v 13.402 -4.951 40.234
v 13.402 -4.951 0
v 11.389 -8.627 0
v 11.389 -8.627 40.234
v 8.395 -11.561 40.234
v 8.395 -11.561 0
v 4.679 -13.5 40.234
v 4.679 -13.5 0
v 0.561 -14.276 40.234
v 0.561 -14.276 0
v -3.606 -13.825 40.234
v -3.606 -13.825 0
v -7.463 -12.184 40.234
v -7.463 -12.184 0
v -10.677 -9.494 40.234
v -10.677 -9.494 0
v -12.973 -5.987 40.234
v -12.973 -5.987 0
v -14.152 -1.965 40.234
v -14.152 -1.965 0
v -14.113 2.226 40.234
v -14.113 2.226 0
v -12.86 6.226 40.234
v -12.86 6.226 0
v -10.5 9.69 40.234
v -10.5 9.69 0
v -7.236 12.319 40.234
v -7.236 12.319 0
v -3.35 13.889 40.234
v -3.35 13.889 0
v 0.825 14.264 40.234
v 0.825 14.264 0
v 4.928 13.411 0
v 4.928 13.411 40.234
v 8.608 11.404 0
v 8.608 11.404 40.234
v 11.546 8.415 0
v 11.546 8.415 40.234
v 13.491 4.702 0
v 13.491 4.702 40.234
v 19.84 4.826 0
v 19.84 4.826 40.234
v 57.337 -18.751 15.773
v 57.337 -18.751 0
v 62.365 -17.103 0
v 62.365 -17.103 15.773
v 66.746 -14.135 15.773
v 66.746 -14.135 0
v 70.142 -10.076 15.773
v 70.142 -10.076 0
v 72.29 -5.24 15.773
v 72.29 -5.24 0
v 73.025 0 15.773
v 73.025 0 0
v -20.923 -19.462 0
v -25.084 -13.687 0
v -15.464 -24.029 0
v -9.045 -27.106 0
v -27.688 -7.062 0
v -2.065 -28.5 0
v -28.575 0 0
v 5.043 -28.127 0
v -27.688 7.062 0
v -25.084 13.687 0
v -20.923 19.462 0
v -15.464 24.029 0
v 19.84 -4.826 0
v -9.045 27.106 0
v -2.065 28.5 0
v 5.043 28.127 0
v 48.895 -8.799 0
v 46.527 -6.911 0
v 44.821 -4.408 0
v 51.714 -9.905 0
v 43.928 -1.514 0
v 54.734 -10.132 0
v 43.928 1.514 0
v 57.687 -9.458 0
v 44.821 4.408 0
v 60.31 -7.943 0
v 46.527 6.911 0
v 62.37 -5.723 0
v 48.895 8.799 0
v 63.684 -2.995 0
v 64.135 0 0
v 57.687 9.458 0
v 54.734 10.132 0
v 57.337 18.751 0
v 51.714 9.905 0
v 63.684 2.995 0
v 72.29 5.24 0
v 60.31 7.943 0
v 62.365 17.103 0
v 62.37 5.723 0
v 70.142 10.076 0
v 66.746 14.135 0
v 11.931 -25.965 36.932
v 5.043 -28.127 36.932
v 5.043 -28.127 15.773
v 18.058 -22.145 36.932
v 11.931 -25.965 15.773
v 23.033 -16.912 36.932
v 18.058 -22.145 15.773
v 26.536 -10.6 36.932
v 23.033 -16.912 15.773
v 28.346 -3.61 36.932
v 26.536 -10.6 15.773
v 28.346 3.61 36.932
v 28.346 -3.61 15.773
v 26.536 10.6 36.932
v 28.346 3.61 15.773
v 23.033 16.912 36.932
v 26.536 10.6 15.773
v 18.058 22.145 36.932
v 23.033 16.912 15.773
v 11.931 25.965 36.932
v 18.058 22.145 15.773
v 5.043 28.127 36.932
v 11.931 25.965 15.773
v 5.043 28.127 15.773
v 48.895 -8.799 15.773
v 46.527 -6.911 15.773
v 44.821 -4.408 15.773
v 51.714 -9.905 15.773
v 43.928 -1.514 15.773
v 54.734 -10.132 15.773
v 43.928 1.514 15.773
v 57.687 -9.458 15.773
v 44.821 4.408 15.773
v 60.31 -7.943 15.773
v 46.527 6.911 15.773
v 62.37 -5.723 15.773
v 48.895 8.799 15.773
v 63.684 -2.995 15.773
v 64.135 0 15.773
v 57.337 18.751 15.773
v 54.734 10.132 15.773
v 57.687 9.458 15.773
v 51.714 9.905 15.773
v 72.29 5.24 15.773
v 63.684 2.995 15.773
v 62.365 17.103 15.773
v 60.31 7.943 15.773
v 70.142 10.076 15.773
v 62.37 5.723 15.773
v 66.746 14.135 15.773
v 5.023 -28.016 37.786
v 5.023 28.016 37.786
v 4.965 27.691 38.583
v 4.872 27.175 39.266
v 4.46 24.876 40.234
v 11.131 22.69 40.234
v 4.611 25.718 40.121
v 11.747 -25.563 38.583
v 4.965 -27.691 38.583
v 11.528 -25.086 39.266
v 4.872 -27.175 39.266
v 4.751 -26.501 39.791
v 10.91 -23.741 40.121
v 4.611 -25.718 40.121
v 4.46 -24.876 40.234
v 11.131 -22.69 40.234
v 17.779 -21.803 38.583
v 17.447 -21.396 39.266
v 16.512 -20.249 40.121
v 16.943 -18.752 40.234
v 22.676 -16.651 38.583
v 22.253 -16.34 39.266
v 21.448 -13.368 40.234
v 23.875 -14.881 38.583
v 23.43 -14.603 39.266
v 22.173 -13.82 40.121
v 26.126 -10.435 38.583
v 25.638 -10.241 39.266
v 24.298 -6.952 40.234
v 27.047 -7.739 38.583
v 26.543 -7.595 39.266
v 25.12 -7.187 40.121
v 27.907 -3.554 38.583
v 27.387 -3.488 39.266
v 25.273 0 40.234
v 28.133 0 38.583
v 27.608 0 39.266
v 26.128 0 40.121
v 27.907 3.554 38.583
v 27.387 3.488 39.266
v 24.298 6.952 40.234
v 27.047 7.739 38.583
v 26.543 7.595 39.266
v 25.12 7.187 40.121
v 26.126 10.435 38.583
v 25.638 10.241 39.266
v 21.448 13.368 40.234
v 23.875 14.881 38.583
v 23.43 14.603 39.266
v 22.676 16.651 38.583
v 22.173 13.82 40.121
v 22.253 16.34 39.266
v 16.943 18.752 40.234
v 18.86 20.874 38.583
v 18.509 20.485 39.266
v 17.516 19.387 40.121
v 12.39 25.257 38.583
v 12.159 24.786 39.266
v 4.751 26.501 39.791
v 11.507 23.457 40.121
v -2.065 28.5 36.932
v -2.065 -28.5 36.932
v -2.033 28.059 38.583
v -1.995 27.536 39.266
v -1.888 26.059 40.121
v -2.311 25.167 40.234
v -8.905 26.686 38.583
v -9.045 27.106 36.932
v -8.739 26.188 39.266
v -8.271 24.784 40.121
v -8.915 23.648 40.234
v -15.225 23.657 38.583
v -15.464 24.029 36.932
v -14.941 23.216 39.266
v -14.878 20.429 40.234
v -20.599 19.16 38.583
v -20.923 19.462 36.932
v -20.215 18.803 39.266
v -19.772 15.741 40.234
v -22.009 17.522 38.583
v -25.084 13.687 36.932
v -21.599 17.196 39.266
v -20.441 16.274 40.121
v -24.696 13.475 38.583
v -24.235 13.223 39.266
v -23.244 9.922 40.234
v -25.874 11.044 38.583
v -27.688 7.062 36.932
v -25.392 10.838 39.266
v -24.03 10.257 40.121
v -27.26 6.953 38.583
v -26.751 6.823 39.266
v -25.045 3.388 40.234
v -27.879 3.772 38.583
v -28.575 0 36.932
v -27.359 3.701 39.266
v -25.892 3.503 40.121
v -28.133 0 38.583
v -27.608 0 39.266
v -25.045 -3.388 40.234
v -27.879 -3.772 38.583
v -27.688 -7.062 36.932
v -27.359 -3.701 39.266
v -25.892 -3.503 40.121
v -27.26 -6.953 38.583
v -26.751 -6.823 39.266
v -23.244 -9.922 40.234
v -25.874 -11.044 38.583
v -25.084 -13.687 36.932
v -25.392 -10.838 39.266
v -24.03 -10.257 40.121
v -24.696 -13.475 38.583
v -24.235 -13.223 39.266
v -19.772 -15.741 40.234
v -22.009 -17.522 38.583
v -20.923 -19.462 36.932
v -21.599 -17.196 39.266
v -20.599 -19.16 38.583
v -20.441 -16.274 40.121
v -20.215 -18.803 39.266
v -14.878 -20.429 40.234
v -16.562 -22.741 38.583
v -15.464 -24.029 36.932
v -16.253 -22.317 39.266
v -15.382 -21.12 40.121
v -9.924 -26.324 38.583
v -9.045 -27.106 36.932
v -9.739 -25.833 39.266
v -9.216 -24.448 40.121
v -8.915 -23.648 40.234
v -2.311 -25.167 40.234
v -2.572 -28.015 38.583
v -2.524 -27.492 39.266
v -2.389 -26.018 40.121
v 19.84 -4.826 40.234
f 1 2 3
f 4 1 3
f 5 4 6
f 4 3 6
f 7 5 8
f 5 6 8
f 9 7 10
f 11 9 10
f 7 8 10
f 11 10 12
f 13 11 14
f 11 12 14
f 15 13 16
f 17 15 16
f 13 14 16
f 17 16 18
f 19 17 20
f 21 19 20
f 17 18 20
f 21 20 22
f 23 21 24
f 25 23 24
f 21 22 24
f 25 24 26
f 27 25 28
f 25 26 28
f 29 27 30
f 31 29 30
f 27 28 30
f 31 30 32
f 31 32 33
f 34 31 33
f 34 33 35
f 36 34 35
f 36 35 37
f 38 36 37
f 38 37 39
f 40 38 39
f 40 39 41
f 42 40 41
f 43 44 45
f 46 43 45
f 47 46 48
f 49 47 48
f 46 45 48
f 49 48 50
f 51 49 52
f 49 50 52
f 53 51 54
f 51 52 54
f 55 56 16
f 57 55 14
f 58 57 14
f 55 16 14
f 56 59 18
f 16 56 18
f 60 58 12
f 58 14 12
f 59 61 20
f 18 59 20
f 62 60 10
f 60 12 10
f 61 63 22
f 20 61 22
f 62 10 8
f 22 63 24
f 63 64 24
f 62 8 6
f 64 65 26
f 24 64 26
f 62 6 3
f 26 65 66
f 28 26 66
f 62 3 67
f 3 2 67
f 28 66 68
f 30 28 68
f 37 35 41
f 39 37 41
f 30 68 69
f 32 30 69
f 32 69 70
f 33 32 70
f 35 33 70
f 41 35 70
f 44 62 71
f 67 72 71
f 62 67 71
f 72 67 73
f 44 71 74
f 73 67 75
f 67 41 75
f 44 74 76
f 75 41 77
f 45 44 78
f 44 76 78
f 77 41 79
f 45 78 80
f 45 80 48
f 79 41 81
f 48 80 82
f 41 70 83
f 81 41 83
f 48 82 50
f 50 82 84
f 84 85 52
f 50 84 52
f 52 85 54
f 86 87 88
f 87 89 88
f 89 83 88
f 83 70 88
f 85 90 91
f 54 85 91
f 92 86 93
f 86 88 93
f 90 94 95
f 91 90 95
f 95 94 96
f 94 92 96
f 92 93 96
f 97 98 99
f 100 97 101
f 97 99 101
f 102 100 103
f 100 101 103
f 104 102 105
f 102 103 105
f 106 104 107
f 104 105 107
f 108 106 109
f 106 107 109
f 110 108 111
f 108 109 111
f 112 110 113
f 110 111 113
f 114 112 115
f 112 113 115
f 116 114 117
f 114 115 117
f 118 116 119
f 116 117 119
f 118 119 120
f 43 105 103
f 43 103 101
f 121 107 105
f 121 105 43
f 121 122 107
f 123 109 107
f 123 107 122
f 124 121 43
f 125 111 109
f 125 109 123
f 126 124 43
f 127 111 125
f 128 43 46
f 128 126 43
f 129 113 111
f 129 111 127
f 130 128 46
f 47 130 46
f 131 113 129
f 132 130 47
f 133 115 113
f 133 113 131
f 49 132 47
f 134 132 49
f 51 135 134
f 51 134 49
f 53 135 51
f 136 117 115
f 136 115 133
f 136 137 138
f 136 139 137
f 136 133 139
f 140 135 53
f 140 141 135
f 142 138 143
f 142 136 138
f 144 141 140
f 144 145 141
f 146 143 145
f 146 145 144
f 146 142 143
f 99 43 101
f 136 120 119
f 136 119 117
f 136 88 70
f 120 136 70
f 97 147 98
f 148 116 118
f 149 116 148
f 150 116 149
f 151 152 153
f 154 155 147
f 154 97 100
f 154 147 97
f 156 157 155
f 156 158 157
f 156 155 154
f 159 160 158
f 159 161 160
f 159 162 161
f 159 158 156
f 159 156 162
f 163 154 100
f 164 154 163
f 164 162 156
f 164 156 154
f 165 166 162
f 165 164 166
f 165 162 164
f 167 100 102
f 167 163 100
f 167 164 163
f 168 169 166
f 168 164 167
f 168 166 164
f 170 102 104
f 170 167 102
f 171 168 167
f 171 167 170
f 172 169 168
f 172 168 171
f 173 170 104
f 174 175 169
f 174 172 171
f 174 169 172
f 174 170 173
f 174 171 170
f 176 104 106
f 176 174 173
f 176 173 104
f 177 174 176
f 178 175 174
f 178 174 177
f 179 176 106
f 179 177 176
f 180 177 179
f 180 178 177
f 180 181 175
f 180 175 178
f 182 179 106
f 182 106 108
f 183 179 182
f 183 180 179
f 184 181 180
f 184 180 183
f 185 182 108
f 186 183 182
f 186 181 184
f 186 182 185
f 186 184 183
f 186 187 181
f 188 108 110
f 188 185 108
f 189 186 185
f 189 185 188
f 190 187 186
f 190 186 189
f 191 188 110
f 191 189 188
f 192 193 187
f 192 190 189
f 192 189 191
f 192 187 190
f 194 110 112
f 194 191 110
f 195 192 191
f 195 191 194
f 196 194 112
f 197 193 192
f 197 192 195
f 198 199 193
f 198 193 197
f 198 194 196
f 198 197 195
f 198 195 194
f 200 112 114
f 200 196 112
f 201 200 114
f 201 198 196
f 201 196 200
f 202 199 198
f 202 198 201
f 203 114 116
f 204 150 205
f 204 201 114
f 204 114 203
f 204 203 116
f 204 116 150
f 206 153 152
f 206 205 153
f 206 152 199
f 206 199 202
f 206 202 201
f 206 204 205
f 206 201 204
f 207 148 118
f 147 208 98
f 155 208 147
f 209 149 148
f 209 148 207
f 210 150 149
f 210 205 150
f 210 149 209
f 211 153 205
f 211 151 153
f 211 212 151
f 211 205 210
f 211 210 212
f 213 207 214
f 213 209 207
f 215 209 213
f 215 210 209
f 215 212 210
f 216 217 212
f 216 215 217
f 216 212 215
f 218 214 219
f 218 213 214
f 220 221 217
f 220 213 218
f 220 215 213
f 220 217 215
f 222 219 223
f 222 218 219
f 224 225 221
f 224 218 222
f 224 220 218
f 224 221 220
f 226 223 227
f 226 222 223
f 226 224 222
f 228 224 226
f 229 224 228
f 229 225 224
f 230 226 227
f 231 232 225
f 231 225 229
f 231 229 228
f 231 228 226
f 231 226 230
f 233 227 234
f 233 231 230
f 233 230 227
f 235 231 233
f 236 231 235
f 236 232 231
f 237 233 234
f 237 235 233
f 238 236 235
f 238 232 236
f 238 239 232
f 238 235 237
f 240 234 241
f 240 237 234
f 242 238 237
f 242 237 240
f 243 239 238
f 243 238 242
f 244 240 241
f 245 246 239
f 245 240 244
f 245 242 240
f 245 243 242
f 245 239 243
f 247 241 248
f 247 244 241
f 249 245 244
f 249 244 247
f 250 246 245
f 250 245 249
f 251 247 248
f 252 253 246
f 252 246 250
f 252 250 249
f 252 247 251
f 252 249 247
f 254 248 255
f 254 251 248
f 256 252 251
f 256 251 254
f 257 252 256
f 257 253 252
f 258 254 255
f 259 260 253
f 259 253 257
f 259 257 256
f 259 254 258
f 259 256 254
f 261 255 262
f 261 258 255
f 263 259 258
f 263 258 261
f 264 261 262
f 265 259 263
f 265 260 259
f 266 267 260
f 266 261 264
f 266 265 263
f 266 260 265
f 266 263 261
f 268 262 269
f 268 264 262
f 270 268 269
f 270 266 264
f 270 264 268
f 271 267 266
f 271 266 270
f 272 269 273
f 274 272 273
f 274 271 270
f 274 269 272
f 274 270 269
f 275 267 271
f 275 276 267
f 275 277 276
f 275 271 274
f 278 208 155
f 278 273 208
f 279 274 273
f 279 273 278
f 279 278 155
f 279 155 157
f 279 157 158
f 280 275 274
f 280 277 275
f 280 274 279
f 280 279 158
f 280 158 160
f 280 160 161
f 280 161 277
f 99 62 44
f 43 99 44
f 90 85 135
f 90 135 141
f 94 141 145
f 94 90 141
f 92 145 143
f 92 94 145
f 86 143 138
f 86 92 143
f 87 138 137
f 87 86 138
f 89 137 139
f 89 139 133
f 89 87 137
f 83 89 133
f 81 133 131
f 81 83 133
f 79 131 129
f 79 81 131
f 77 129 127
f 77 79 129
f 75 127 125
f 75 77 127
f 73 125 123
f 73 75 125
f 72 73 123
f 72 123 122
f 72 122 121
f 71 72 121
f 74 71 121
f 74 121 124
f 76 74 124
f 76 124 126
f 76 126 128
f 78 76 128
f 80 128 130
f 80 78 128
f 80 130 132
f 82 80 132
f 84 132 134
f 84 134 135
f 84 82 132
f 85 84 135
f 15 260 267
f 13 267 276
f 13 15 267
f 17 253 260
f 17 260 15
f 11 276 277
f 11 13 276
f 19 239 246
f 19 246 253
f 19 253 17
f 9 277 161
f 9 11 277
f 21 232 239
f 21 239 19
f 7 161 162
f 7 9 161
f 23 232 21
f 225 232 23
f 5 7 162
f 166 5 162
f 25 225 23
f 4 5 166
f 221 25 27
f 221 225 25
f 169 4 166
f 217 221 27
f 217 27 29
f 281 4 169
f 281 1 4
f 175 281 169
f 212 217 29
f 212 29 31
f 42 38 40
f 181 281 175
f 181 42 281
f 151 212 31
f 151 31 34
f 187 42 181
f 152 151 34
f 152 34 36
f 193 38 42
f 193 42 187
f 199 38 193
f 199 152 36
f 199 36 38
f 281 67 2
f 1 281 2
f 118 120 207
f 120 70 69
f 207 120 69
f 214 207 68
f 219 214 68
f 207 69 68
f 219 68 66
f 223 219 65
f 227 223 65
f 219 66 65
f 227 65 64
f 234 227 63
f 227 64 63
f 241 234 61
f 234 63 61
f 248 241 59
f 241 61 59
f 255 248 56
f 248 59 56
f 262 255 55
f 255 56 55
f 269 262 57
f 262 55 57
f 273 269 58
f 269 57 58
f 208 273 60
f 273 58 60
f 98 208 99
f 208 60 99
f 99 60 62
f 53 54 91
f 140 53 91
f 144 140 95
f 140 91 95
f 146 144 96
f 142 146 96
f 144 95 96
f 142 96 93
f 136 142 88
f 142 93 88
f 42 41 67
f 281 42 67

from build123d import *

# Parameters (mm, degrees)
F1_DEPTH = 40.2336
F0_R     = 10.16
F2_DEPTH = 15.7734
F3_R     = 3.302


# Not quite as in the source:
# - a feature names something its author has since deleted; it is built from what else it names


with BuildPart() as f1:
    # F0 (on Top) → F1 (new body)
    with BuildSketch(Plane.XY):
        with BuildLine():
            ThreePointArc((5.0426470588, -28.1265414802), (21.9160245563, -18.3362616868), (28.575, 0))
            ThreePointArc((28.575, 0), (21.9160245563, 18.3362616868), (5.0426470588, 28.1265414802))
            ThreePointArc((5.0426470588, 28.1265414802), (-28.575, 0), (5.0426470588, -28.1265414802))
        make_face()
        with BuildLine():
            ThreePointArc((13.4021500625, -4.9512654901), (-14.2868886671, 0.1321683185), (13.4914569997, 4.702472145))
            Line((13.4914569997, 4.702472145), (19.8402553797, 4.826))
            Line((19.8402553797, 4.826), (19.8402553797, -4.826))
            Line((19.8402553797, -4.826), (13.4021500625, -4.9512654901))
        make_face(mode=Mode.SUBTRACT)
    extrude(amount=F1_DEPTH)

    # F0 (on Top) → F2 (join)
    with BuildSketch(Plane.XY):
        with BuildLine():
            ThreePointArc((5.0426470588, 28.1265414802), (21.9160245563, 18.3362616868), (28.575, 0))
            ThreePointArc((28.575, 0), (21.9160245563, -18.3362616868), (5.0426470588, -28.1265414802))
            Line((5.0426470588, -28.1265414802), (57.3367647059, -18.7510276535))
            ThreePointArc((57.3367647059, -18.7510276535), (34.925, 0), (57.3367647059, 18.7510276535))
            Line((57.3367647059, 18.7510276535), (5.0426470588, 28.1265414802))
        make_face()
        with BuildLine():
            ThreePointArc((73.025, 0), (68.5856830375, 12.2241744579), (57.3367647059, 18.7510276535))
            ThreePointArc((57.3367647059, 18.7510276535), (34.925, 0), (57.3367647059, -18.7510276535))
            ThreePointArc((57.3367647059, -18.7510276535), (68.5856830375, -12.2241744579), (73.025, 0))
        make_face()
        with Locations((53.975, 0)):
            Circle(F0_R, mode=Mode.SUBTRACT)
    extrude(amount=F2_DEPTH)

    # F3
    f3_edges = [f1.edges().sort_by_distance(p)[0] for p in [
        (-5.042647, 28.126541, 40.2336),
    ]]
    fillet(f3_edges, radius=F3_R)


solid = f1.part
